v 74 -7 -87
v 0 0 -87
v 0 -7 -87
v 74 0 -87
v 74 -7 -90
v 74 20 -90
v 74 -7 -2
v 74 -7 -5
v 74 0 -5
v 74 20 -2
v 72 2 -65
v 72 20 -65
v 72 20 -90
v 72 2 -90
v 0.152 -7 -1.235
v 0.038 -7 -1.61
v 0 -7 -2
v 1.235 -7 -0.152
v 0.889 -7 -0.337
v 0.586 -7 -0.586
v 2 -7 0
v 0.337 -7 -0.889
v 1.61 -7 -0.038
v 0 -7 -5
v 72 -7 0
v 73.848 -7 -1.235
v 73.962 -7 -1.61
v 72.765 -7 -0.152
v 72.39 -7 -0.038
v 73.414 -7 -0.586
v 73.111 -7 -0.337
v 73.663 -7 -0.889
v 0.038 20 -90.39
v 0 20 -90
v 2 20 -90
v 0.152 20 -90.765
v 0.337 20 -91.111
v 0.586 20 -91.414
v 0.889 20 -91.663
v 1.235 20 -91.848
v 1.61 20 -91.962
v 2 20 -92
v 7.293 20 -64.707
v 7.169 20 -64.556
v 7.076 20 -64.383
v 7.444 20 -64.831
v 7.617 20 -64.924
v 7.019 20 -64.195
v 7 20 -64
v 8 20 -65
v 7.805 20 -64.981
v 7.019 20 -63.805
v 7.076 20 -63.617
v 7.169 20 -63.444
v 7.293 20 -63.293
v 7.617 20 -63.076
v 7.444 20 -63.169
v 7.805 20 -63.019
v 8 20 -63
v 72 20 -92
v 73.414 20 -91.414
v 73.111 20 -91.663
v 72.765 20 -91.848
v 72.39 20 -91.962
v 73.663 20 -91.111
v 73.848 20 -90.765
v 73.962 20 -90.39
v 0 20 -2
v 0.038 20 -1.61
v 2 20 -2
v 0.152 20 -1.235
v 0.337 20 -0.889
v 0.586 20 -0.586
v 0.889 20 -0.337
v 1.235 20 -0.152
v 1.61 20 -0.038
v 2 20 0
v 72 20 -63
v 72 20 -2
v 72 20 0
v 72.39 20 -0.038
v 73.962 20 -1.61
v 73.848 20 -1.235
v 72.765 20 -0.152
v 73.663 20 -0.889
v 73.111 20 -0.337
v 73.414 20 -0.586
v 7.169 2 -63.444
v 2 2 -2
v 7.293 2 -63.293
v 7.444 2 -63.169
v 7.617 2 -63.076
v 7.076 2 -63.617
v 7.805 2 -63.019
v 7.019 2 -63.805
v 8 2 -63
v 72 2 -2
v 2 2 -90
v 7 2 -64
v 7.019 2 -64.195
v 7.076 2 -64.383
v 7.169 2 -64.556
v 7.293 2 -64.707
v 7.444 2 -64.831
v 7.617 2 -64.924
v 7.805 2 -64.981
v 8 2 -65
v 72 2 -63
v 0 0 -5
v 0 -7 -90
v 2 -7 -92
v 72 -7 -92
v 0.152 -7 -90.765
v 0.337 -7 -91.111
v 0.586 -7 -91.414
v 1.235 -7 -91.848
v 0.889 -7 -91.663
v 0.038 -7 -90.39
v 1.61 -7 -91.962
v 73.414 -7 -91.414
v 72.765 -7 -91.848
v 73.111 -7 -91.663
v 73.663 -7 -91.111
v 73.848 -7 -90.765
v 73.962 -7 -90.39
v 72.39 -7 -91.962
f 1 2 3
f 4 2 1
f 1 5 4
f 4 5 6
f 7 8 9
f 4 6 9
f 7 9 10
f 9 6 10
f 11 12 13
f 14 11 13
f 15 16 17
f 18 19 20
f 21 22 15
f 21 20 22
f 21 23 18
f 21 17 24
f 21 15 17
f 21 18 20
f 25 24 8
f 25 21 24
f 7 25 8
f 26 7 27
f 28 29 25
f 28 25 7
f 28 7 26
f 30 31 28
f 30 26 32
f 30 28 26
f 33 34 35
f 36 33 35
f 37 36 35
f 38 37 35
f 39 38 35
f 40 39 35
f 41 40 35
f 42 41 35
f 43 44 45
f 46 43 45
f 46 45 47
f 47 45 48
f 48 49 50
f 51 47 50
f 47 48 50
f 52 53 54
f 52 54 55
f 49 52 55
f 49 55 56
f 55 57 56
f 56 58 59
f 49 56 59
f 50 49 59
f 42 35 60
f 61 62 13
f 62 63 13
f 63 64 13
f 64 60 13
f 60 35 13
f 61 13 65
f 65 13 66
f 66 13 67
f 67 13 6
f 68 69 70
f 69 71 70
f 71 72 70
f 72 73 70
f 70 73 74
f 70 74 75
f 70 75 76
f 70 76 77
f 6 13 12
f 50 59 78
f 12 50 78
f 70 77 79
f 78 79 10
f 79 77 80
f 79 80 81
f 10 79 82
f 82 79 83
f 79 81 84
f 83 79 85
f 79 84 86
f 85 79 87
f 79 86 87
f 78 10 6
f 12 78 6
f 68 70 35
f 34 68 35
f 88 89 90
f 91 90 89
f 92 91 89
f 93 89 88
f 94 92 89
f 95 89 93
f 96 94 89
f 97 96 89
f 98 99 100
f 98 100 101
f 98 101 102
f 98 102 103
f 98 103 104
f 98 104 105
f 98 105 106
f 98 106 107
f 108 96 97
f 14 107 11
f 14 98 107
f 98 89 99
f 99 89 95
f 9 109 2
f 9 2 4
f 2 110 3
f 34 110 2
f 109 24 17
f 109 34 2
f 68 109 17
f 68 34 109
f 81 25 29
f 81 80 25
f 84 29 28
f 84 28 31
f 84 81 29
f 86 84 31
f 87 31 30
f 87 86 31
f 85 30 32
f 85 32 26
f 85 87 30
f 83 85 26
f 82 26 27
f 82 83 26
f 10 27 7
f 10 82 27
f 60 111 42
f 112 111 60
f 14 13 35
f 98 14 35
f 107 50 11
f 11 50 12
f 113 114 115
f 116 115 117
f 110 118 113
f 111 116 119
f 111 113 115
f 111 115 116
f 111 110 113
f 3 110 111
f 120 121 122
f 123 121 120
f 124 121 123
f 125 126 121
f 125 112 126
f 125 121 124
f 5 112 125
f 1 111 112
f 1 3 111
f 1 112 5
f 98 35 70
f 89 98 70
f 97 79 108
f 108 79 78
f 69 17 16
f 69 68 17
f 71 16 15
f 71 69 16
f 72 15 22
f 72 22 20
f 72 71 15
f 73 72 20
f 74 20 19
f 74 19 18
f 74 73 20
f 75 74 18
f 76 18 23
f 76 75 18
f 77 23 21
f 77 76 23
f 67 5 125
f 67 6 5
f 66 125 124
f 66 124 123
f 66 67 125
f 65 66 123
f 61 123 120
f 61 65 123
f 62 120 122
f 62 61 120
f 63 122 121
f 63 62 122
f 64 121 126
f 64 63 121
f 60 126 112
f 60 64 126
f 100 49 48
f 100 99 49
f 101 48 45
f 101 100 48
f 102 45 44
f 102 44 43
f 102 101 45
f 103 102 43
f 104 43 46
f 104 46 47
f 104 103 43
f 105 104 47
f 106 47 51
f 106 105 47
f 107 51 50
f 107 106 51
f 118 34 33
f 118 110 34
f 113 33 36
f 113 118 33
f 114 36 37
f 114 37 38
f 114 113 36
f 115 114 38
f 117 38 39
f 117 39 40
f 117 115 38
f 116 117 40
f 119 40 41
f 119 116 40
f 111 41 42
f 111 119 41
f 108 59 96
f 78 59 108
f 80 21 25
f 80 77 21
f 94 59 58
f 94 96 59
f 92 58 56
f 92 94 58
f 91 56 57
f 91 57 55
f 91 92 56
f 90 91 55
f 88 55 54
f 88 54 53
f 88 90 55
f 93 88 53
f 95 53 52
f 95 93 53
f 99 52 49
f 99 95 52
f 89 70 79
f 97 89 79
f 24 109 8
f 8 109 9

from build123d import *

# Parameters (mm, degrees)
SKETCH_1_W          = 74
SKETCH_1_H          = 65
EXTRUDE_1_DEPTH     = 20
SKETCH_2_W          = 70
SKETCH_2_H          = 61
CUT_EXTRUDE_1_DEPTH = 18
SKETCH_3_W          = 5
SKETCH_3_H          = 2
CUT_EXTRUDE_2_DEPTH = 18
SKETCH_4_W          = 74
SKETCH_4_H          = 27
EXTRUDE_2_DEPTH     = 20
CUT_EXTRUDE_3_DEPTH = 18
SKETCH_6_W          = 74
SKETCH_6_H          = 5
EXTRUDE_3_DEPTH     = 7
FILLET_1_R          = 2
FILLET_2_R          = 2
FILLET_3_R          = 2
FILLET_5_R          = 1


with BuildPart() as part:
    # 草图1 → 凸台-拉伸1 (new body)
    with BuildSketch(Plane(origin=(0, 0, 0), x_dir=(1, 0, 0), z_dir=(0, 1, 0))):
        with Locations((37, 32.5)):
            Rectangle(SKETCH_1_W, SKETCH_1_H)
    extrude(amount=EXTRUDE_1_DEPTH)

    # 草图2 → 切除-拉伸1 (cut)
    with BuildSketch(Plane(origin=(0, 20, 0), x_dir=(1, 0, 0), z_dir=(0, 1, 0))):
        with Locations((37, 32.5)):
            Rectangle(SKETCH_2_W, SKETCH_2_H)
    extrude(amount=-CUT_EXTRUDE_1_DEPTH, mode=Mode.SUBTRACT)

    # 草图3 → 切除-拉伸2 (cut)
    with BuildSketch(Plane(origin=(0, 20, 0), x_dir=(1, 0, 0), z_dir=(0, 1, 0))):
        with Locations((4.5, 64)):
            Rectangle(SKETCH_3_W, SKETCH_3_H)
    extrude(amount=-CUT_EXTRUDE_2_DEPTH, mode=Mode.SUBTRACT)

    # 草图4 → 凸台-拉伸2 (add)
    with BuildSketch(Plane.XZ):
        with Locations((37, -78.5)):
            Rectangle(SKETCH_4_W, SKETCH_4_H)
    extrude(amount=-EXTRUDE_2_DEPTH)

    # 草图5 → 切除-拉伸3 (cut)
    with BuildSketch(Plane(origin=(0, 20, 0), x_dir=(1, 0, 0), z_dir=(0, 1, 0))):
        Polygon((2, 65), (7, 65), (72, 65), (72, 90), (2, 90), align=None)
    extrude(amount=-CUT_EXTRUDE_3_DEPTH, mode=Mode.SUBTRACT)

    # 草图6 → 凸台-拉伸3 (add)
    with BuildSketch(Plane.XZ):
        with Locations((37, -2.5)):
            Rectangle(SKETCH_6_W, SKETCH_6_H)
        with Locations((37, -89.5)):
            Rectangle(SKETCH_6_W, SKETCH_6_H)
    extrude(amount=EXTRUDE_3_DEPTH)

    # 圆角1
    fillet_1_edges = [part.edges().sort_by_distance(p)[0] for p in [
        (0, 6.5, 0),
    ]]
    fillet(fillet_1_edges, radius=FILLET_1_R)

    # 圆角2
    fillet_2_edges = [part.edges().sort_by_distance(p)[0] for p in [
        (74, 6.5, 0),
    ]]
    fillet(fillet_2_edges, radius=FILLET_2_R)

    # 圆角3
    fillet_3_edges = [part.edges().sort_by_distance(p)[0] for p in [
        (0, 6.5, -92),
        (74, 6.5, -92),
    ]]
    fillet(fillet_3_edges, radius=FILLET_3_R)

    # 圆角5
    fillet_5_edges = [part.edges().sort_by_distance(p)[0] for p in [
        (7, 11, -65),
        (7, 11, -63),
    ]]
    fillet(fillet_5_edges, radius=FILLET_5_R - 0.0001)  # a hair under: the kernel refuses the full size


solid = part.part
